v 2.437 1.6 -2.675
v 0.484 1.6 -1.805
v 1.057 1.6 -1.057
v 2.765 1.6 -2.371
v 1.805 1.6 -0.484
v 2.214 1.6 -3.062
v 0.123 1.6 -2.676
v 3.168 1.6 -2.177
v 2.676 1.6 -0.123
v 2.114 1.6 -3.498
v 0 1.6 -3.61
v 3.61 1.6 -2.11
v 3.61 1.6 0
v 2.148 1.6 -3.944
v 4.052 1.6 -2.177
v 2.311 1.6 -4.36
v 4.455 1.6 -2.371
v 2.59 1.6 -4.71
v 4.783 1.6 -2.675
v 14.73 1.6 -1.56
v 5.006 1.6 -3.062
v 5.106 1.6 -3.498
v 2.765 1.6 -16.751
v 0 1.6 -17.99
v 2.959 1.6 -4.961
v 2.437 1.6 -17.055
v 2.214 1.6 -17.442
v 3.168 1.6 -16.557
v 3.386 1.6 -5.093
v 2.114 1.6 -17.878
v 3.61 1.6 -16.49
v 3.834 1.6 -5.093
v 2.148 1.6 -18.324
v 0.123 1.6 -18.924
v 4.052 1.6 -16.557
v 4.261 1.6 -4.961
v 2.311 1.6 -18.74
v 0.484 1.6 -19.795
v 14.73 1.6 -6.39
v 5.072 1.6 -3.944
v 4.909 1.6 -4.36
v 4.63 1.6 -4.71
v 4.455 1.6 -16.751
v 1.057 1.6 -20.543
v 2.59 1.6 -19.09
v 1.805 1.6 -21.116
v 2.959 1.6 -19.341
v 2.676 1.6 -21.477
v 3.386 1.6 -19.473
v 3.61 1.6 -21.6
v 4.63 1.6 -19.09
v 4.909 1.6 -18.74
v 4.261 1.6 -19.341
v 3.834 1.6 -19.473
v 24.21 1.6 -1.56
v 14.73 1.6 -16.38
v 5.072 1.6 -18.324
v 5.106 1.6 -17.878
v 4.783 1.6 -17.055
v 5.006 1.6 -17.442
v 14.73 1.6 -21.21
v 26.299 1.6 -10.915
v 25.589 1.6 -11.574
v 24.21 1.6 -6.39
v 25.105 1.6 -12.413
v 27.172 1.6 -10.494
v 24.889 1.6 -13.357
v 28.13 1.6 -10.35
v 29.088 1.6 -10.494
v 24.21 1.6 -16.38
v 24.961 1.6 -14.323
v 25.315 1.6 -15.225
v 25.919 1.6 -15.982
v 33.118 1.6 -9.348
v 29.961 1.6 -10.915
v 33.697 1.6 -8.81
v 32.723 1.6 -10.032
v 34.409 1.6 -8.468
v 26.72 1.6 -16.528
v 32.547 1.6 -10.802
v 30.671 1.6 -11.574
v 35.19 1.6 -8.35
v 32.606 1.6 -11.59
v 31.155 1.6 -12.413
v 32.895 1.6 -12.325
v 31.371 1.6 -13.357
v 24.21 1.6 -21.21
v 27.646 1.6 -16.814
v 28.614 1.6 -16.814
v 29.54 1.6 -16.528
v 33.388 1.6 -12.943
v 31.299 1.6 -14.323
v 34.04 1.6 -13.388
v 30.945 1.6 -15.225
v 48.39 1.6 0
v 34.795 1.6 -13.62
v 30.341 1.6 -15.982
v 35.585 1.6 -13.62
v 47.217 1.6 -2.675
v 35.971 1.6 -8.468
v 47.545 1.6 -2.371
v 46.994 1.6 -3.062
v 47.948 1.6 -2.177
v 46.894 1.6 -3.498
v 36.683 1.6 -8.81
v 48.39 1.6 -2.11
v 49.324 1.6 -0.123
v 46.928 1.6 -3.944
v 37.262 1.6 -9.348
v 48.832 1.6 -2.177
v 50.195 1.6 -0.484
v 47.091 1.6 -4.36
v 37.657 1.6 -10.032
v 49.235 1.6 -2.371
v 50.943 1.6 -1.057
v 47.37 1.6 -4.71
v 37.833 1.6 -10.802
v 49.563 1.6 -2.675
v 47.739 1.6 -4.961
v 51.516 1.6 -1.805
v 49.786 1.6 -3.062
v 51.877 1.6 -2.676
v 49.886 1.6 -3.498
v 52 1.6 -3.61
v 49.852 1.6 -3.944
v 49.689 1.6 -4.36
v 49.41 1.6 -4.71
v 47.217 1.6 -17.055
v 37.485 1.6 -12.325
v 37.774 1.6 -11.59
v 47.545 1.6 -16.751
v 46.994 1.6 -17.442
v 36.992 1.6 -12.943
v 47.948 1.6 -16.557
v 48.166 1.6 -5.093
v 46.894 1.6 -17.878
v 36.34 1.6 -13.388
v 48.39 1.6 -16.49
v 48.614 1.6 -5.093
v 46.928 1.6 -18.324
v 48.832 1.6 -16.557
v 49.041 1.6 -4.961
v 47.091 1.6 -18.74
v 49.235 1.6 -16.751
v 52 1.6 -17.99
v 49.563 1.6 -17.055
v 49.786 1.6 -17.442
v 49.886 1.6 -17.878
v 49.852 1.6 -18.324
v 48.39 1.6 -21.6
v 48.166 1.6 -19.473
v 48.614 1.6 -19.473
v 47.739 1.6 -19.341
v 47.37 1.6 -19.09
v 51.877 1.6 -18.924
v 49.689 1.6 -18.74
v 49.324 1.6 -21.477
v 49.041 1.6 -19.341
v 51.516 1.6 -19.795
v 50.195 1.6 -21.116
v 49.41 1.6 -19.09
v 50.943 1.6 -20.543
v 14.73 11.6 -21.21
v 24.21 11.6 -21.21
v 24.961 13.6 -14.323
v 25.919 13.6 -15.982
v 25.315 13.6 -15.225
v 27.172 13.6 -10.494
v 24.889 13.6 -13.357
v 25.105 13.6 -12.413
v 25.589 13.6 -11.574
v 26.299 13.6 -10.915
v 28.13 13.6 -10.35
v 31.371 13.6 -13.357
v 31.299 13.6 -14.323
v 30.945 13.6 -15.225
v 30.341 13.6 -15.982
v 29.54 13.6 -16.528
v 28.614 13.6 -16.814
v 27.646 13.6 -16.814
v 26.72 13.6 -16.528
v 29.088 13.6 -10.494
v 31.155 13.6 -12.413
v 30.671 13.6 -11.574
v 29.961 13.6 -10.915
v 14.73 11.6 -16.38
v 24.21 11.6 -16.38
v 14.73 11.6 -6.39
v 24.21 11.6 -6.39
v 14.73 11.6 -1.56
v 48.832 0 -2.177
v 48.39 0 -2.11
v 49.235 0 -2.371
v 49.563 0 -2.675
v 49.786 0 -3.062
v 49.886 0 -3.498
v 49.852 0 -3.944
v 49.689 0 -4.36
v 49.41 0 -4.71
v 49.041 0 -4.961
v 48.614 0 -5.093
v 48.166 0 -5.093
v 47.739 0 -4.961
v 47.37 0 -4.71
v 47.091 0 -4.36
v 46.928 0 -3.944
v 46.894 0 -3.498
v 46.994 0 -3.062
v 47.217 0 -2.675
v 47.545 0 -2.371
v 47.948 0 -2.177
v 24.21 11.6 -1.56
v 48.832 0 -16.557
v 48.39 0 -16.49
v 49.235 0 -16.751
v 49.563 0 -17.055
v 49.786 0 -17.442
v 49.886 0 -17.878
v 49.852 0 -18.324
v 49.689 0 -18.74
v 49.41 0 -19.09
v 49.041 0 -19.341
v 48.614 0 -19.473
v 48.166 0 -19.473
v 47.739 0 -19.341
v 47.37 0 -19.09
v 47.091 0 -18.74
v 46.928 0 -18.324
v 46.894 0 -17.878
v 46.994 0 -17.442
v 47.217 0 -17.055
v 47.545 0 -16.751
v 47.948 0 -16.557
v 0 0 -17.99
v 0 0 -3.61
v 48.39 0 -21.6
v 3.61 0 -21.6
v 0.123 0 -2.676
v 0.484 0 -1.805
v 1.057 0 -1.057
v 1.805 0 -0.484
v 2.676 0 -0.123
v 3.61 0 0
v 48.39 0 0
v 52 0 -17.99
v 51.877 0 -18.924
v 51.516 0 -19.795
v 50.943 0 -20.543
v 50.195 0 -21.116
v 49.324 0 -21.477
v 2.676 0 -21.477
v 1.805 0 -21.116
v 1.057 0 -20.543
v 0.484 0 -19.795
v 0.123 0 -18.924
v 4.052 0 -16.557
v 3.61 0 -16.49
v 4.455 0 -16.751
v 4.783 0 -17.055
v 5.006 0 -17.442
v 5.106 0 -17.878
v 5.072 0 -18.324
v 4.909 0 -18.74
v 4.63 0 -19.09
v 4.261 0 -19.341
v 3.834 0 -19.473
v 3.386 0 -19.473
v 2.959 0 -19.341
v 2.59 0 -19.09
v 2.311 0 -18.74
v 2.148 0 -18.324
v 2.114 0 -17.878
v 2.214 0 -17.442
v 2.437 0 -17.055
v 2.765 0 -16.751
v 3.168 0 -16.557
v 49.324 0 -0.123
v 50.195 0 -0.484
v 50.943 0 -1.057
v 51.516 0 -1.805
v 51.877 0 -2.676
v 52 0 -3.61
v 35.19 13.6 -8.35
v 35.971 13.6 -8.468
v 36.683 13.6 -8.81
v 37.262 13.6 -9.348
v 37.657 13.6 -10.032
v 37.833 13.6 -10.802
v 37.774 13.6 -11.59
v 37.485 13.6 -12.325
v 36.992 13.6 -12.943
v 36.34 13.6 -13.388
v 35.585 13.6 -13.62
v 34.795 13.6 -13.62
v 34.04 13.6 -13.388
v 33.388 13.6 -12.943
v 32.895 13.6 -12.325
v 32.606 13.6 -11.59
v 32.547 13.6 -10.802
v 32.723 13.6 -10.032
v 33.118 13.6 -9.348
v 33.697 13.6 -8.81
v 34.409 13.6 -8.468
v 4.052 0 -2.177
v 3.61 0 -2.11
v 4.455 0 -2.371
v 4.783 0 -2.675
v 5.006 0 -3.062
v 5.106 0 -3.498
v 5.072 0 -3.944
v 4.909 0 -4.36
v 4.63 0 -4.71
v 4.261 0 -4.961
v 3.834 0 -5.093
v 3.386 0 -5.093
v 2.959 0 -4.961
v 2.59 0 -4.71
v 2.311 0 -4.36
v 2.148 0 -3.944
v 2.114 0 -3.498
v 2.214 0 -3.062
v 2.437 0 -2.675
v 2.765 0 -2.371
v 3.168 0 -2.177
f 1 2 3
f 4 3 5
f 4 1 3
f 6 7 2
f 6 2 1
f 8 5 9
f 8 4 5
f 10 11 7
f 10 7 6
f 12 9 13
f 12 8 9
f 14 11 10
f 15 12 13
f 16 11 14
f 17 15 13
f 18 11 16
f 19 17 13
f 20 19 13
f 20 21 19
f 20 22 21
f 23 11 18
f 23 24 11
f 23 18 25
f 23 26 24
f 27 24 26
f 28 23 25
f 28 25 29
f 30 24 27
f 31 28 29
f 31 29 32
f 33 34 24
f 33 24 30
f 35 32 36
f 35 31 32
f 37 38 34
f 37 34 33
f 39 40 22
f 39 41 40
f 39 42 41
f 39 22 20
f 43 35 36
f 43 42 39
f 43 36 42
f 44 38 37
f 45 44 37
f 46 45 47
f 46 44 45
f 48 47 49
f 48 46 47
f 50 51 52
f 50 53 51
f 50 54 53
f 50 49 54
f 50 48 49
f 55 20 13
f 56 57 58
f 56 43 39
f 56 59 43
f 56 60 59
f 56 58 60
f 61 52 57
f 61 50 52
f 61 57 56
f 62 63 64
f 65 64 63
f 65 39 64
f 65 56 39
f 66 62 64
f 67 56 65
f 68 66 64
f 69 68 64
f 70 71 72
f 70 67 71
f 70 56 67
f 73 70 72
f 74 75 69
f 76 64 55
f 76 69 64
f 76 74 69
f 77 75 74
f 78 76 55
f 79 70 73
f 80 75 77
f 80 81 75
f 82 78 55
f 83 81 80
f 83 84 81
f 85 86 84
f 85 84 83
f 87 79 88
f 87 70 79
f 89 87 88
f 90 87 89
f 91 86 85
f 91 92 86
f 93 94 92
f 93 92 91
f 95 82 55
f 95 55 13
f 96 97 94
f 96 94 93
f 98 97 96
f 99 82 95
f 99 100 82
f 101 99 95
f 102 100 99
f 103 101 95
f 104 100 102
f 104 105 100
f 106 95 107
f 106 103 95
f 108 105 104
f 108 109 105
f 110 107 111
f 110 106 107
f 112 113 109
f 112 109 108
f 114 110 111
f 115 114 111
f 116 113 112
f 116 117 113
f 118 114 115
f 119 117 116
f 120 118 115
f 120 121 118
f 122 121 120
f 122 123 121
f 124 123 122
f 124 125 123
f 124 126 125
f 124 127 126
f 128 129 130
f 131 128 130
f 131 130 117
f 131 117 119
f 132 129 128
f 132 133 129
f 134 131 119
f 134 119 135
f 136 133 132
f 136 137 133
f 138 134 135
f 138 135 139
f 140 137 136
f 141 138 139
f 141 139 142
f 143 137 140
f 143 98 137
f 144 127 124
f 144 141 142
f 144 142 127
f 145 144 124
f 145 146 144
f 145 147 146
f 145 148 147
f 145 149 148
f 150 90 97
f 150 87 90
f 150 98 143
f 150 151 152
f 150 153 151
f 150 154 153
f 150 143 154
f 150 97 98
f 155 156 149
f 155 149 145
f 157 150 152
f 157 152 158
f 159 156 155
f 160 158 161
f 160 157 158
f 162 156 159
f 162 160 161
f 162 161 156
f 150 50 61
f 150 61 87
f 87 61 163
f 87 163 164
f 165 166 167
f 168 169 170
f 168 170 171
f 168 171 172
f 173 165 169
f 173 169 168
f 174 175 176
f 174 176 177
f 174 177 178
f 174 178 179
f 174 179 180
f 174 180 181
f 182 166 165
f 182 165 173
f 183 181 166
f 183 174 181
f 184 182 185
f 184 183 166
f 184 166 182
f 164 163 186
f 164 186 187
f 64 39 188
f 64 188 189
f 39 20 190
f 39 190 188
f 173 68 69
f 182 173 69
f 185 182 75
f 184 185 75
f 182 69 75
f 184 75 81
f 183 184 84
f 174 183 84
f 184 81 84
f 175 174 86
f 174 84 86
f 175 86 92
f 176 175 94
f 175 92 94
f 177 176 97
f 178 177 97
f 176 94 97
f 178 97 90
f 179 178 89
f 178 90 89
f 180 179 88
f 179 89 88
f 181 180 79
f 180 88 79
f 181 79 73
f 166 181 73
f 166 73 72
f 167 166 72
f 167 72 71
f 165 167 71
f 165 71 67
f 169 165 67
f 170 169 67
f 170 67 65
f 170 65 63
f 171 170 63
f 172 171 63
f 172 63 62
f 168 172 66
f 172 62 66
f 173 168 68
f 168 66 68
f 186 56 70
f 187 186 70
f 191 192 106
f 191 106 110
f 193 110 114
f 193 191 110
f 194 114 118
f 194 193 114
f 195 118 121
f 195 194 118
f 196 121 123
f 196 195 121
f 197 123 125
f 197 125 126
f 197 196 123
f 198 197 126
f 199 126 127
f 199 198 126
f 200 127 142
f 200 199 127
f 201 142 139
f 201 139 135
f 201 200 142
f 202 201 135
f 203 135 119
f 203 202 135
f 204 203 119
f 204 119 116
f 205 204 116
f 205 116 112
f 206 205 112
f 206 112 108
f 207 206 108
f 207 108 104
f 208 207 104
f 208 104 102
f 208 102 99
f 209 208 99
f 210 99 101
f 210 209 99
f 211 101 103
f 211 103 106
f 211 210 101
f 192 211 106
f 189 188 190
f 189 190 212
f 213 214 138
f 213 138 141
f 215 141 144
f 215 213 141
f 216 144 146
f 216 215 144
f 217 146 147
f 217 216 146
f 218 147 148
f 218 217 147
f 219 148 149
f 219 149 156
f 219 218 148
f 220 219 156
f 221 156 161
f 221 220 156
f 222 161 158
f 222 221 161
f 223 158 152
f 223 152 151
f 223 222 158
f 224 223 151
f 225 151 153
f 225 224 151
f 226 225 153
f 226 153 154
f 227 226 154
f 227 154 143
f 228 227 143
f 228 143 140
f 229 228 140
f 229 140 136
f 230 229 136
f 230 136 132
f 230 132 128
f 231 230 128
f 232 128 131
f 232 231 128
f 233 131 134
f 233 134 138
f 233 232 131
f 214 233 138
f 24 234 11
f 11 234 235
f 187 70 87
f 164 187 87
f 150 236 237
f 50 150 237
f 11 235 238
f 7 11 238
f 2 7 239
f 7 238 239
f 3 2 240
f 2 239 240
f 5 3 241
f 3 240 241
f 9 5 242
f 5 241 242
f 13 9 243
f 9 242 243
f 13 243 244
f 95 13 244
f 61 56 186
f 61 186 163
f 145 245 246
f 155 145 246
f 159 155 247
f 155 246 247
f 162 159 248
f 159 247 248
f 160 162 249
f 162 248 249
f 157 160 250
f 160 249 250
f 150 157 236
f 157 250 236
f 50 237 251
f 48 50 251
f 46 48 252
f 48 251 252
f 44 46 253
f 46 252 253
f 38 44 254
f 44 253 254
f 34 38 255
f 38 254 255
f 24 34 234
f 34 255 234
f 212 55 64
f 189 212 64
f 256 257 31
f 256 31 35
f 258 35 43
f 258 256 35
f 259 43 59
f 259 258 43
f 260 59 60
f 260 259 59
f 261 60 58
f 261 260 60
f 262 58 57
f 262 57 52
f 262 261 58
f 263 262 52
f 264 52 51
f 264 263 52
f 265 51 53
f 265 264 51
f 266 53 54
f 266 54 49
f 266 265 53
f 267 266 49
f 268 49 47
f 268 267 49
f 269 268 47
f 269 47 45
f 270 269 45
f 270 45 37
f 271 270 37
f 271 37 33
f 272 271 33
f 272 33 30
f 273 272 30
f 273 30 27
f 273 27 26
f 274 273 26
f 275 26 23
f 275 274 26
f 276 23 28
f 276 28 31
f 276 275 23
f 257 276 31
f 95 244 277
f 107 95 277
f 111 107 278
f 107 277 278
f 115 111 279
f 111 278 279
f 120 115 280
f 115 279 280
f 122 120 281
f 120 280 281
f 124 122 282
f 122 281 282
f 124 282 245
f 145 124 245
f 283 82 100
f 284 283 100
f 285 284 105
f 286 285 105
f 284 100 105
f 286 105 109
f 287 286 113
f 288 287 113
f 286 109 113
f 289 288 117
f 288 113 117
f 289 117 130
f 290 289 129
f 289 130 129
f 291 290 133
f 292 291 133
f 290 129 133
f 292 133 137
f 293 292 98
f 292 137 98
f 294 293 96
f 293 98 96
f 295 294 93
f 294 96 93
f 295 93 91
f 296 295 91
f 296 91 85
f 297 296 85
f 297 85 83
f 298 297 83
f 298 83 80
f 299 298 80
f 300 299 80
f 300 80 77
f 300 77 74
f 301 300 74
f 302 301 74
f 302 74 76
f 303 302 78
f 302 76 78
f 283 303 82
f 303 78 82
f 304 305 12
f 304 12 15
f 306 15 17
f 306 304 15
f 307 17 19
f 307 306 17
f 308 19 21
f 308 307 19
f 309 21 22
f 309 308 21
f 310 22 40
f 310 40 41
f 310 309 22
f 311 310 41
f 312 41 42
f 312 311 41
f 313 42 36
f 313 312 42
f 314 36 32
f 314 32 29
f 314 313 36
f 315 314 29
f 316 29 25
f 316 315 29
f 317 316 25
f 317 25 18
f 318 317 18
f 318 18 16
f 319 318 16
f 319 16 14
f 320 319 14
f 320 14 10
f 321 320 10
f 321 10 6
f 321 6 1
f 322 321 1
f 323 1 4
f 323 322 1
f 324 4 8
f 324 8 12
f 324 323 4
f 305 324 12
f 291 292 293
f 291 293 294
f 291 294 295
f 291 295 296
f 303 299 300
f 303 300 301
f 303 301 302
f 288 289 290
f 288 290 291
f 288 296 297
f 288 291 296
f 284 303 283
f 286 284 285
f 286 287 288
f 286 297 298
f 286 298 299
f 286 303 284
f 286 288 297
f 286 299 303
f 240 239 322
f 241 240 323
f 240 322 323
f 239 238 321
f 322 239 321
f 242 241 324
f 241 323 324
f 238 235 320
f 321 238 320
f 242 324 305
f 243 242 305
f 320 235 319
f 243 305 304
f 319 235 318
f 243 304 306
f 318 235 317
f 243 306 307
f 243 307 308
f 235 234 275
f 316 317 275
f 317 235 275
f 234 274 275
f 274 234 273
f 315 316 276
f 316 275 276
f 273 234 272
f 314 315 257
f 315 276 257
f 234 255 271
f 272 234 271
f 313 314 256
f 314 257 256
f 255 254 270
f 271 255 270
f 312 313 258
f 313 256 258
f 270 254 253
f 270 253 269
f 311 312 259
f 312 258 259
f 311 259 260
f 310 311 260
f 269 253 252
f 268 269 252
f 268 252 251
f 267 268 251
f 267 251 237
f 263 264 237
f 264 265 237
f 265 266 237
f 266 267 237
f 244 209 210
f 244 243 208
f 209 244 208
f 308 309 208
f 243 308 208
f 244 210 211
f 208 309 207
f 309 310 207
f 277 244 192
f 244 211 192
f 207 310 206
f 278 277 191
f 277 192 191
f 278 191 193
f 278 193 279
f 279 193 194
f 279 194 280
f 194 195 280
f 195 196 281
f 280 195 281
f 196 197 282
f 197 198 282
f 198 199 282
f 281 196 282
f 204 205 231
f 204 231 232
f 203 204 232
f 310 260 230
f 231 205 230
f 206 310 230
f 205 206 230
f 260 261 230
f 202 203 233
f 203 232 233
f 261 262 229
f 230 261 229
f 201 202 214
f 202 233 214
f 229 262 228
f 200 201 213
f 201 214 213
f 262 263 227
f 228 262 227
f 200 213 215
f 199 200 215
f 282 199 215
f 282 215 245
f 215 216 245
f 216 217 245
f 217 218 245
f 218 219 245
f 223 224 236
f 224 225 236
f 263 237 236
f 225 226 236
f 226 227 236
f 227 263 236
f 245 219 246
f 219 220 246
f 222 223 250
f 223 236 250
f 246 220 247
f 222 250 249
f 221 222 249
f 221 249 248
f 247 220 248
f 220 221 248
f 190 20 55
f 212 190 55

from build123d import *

# Parameters (mm, degrees)
SKETCH1_R           = 1.5
BOSS_EXTRUDE1_DEPTH = 1.6
SKETCH2_W           = 9.48
SKETCH2_H           = 4.83
BOSS_EXTRUDE2_DEPTH = 10
SKETCH3_R           = 2.65
SKETCH3_R_2         = 3.25
BOSS_EXTRUDE3_DEPTH = 12


with BuildPart() as part:
    # Sketch1 → Boss-Extrude1 (new body)
    with BuildSketch(Plane(origin=(0, 0, 0), x_dir=(1, 0, 0), z_dir=(0, 1, 0))):
        with BuildLine():
            Line((3.61, 0), (48.39, 0))
            ThreePointArc((48.39, 0), (50.94265548, 1.05734452), (52, 3.61))
            Line((52, 3.61), (52, 17.99))
            ThreePointArc((52, 17.99), (50.94265548, 20.54265548), (48.39, 21.6))
            Line((48.39, 21.6), (3.61, 21.6))
            ThreePointArc((3.61, 21.6), (1.05734452, 20.54265548), (0, 17.99))
            Line((0, 17.99), (0, 3.61))
            ThreePointArc((0, 3.61), (1.05734452, 1.05734452), (3.61, 0))
        make_face()
        with Locations(Location((3.61, 17.99, 0), (0, 0, 270))):
            Circle(SKETCH1_R, mode=Mode.SUBTRACT)
        with Locations(Location((48.39, 17.99, 0), (0, 0, 270))):
            Circle(SKETCH1_R, mode=Mode.SUBTRACT)
        with Locations(Location((48.39, 3.61, 0), (0, 0, 270))):
            Circle(SKETCH1_R, mode=Mode.SUBTRACT)
        with Locations(Location((3.61, 3.61, 0), (0, 0, 270))):
            Circle(SKETCH1_R, mode=Mode.SUBTRACT)
    extrude(amount=BOSS_EXTRUDE1_DEPTH)

    # Sketch2 → Boss-Extrude2 (add)
    with BuildSketch(Plane(origin=(0, 1.6, 0), x_dir=(1, 0, 0), z_dir=(0, 1, 0))):
        with Locations((19.47, 3.975)):
            Rectangle(SKETCH2_W, SKETCH2_H)
        with Locations((19.47, 18.795)):
            Rectangle(SKETCH2_W, SKETCH2_H)
    extrude(amount=BOSS_EXTRUDE2_DEPTH)

    # Sketch3 → Boss-Extrude3 (add)
    with BuildSketch(Plane(origin=(0, 1.6, 0), x_dir=(1, 0, 0), z_dir=(0, 1, 0))):
        with Locations(Location((35.19, 11, 0), (0, 0, 270))):
            Circle(SKETCH3_R)
        with Locations(Location((28.13, 13.6, 0), (0, 0, 270))):
            Circle(SKETCH3_R_2)
    extrude(amount=BOSS_EXTRUDE3_DEPTH)


solid = part.part
